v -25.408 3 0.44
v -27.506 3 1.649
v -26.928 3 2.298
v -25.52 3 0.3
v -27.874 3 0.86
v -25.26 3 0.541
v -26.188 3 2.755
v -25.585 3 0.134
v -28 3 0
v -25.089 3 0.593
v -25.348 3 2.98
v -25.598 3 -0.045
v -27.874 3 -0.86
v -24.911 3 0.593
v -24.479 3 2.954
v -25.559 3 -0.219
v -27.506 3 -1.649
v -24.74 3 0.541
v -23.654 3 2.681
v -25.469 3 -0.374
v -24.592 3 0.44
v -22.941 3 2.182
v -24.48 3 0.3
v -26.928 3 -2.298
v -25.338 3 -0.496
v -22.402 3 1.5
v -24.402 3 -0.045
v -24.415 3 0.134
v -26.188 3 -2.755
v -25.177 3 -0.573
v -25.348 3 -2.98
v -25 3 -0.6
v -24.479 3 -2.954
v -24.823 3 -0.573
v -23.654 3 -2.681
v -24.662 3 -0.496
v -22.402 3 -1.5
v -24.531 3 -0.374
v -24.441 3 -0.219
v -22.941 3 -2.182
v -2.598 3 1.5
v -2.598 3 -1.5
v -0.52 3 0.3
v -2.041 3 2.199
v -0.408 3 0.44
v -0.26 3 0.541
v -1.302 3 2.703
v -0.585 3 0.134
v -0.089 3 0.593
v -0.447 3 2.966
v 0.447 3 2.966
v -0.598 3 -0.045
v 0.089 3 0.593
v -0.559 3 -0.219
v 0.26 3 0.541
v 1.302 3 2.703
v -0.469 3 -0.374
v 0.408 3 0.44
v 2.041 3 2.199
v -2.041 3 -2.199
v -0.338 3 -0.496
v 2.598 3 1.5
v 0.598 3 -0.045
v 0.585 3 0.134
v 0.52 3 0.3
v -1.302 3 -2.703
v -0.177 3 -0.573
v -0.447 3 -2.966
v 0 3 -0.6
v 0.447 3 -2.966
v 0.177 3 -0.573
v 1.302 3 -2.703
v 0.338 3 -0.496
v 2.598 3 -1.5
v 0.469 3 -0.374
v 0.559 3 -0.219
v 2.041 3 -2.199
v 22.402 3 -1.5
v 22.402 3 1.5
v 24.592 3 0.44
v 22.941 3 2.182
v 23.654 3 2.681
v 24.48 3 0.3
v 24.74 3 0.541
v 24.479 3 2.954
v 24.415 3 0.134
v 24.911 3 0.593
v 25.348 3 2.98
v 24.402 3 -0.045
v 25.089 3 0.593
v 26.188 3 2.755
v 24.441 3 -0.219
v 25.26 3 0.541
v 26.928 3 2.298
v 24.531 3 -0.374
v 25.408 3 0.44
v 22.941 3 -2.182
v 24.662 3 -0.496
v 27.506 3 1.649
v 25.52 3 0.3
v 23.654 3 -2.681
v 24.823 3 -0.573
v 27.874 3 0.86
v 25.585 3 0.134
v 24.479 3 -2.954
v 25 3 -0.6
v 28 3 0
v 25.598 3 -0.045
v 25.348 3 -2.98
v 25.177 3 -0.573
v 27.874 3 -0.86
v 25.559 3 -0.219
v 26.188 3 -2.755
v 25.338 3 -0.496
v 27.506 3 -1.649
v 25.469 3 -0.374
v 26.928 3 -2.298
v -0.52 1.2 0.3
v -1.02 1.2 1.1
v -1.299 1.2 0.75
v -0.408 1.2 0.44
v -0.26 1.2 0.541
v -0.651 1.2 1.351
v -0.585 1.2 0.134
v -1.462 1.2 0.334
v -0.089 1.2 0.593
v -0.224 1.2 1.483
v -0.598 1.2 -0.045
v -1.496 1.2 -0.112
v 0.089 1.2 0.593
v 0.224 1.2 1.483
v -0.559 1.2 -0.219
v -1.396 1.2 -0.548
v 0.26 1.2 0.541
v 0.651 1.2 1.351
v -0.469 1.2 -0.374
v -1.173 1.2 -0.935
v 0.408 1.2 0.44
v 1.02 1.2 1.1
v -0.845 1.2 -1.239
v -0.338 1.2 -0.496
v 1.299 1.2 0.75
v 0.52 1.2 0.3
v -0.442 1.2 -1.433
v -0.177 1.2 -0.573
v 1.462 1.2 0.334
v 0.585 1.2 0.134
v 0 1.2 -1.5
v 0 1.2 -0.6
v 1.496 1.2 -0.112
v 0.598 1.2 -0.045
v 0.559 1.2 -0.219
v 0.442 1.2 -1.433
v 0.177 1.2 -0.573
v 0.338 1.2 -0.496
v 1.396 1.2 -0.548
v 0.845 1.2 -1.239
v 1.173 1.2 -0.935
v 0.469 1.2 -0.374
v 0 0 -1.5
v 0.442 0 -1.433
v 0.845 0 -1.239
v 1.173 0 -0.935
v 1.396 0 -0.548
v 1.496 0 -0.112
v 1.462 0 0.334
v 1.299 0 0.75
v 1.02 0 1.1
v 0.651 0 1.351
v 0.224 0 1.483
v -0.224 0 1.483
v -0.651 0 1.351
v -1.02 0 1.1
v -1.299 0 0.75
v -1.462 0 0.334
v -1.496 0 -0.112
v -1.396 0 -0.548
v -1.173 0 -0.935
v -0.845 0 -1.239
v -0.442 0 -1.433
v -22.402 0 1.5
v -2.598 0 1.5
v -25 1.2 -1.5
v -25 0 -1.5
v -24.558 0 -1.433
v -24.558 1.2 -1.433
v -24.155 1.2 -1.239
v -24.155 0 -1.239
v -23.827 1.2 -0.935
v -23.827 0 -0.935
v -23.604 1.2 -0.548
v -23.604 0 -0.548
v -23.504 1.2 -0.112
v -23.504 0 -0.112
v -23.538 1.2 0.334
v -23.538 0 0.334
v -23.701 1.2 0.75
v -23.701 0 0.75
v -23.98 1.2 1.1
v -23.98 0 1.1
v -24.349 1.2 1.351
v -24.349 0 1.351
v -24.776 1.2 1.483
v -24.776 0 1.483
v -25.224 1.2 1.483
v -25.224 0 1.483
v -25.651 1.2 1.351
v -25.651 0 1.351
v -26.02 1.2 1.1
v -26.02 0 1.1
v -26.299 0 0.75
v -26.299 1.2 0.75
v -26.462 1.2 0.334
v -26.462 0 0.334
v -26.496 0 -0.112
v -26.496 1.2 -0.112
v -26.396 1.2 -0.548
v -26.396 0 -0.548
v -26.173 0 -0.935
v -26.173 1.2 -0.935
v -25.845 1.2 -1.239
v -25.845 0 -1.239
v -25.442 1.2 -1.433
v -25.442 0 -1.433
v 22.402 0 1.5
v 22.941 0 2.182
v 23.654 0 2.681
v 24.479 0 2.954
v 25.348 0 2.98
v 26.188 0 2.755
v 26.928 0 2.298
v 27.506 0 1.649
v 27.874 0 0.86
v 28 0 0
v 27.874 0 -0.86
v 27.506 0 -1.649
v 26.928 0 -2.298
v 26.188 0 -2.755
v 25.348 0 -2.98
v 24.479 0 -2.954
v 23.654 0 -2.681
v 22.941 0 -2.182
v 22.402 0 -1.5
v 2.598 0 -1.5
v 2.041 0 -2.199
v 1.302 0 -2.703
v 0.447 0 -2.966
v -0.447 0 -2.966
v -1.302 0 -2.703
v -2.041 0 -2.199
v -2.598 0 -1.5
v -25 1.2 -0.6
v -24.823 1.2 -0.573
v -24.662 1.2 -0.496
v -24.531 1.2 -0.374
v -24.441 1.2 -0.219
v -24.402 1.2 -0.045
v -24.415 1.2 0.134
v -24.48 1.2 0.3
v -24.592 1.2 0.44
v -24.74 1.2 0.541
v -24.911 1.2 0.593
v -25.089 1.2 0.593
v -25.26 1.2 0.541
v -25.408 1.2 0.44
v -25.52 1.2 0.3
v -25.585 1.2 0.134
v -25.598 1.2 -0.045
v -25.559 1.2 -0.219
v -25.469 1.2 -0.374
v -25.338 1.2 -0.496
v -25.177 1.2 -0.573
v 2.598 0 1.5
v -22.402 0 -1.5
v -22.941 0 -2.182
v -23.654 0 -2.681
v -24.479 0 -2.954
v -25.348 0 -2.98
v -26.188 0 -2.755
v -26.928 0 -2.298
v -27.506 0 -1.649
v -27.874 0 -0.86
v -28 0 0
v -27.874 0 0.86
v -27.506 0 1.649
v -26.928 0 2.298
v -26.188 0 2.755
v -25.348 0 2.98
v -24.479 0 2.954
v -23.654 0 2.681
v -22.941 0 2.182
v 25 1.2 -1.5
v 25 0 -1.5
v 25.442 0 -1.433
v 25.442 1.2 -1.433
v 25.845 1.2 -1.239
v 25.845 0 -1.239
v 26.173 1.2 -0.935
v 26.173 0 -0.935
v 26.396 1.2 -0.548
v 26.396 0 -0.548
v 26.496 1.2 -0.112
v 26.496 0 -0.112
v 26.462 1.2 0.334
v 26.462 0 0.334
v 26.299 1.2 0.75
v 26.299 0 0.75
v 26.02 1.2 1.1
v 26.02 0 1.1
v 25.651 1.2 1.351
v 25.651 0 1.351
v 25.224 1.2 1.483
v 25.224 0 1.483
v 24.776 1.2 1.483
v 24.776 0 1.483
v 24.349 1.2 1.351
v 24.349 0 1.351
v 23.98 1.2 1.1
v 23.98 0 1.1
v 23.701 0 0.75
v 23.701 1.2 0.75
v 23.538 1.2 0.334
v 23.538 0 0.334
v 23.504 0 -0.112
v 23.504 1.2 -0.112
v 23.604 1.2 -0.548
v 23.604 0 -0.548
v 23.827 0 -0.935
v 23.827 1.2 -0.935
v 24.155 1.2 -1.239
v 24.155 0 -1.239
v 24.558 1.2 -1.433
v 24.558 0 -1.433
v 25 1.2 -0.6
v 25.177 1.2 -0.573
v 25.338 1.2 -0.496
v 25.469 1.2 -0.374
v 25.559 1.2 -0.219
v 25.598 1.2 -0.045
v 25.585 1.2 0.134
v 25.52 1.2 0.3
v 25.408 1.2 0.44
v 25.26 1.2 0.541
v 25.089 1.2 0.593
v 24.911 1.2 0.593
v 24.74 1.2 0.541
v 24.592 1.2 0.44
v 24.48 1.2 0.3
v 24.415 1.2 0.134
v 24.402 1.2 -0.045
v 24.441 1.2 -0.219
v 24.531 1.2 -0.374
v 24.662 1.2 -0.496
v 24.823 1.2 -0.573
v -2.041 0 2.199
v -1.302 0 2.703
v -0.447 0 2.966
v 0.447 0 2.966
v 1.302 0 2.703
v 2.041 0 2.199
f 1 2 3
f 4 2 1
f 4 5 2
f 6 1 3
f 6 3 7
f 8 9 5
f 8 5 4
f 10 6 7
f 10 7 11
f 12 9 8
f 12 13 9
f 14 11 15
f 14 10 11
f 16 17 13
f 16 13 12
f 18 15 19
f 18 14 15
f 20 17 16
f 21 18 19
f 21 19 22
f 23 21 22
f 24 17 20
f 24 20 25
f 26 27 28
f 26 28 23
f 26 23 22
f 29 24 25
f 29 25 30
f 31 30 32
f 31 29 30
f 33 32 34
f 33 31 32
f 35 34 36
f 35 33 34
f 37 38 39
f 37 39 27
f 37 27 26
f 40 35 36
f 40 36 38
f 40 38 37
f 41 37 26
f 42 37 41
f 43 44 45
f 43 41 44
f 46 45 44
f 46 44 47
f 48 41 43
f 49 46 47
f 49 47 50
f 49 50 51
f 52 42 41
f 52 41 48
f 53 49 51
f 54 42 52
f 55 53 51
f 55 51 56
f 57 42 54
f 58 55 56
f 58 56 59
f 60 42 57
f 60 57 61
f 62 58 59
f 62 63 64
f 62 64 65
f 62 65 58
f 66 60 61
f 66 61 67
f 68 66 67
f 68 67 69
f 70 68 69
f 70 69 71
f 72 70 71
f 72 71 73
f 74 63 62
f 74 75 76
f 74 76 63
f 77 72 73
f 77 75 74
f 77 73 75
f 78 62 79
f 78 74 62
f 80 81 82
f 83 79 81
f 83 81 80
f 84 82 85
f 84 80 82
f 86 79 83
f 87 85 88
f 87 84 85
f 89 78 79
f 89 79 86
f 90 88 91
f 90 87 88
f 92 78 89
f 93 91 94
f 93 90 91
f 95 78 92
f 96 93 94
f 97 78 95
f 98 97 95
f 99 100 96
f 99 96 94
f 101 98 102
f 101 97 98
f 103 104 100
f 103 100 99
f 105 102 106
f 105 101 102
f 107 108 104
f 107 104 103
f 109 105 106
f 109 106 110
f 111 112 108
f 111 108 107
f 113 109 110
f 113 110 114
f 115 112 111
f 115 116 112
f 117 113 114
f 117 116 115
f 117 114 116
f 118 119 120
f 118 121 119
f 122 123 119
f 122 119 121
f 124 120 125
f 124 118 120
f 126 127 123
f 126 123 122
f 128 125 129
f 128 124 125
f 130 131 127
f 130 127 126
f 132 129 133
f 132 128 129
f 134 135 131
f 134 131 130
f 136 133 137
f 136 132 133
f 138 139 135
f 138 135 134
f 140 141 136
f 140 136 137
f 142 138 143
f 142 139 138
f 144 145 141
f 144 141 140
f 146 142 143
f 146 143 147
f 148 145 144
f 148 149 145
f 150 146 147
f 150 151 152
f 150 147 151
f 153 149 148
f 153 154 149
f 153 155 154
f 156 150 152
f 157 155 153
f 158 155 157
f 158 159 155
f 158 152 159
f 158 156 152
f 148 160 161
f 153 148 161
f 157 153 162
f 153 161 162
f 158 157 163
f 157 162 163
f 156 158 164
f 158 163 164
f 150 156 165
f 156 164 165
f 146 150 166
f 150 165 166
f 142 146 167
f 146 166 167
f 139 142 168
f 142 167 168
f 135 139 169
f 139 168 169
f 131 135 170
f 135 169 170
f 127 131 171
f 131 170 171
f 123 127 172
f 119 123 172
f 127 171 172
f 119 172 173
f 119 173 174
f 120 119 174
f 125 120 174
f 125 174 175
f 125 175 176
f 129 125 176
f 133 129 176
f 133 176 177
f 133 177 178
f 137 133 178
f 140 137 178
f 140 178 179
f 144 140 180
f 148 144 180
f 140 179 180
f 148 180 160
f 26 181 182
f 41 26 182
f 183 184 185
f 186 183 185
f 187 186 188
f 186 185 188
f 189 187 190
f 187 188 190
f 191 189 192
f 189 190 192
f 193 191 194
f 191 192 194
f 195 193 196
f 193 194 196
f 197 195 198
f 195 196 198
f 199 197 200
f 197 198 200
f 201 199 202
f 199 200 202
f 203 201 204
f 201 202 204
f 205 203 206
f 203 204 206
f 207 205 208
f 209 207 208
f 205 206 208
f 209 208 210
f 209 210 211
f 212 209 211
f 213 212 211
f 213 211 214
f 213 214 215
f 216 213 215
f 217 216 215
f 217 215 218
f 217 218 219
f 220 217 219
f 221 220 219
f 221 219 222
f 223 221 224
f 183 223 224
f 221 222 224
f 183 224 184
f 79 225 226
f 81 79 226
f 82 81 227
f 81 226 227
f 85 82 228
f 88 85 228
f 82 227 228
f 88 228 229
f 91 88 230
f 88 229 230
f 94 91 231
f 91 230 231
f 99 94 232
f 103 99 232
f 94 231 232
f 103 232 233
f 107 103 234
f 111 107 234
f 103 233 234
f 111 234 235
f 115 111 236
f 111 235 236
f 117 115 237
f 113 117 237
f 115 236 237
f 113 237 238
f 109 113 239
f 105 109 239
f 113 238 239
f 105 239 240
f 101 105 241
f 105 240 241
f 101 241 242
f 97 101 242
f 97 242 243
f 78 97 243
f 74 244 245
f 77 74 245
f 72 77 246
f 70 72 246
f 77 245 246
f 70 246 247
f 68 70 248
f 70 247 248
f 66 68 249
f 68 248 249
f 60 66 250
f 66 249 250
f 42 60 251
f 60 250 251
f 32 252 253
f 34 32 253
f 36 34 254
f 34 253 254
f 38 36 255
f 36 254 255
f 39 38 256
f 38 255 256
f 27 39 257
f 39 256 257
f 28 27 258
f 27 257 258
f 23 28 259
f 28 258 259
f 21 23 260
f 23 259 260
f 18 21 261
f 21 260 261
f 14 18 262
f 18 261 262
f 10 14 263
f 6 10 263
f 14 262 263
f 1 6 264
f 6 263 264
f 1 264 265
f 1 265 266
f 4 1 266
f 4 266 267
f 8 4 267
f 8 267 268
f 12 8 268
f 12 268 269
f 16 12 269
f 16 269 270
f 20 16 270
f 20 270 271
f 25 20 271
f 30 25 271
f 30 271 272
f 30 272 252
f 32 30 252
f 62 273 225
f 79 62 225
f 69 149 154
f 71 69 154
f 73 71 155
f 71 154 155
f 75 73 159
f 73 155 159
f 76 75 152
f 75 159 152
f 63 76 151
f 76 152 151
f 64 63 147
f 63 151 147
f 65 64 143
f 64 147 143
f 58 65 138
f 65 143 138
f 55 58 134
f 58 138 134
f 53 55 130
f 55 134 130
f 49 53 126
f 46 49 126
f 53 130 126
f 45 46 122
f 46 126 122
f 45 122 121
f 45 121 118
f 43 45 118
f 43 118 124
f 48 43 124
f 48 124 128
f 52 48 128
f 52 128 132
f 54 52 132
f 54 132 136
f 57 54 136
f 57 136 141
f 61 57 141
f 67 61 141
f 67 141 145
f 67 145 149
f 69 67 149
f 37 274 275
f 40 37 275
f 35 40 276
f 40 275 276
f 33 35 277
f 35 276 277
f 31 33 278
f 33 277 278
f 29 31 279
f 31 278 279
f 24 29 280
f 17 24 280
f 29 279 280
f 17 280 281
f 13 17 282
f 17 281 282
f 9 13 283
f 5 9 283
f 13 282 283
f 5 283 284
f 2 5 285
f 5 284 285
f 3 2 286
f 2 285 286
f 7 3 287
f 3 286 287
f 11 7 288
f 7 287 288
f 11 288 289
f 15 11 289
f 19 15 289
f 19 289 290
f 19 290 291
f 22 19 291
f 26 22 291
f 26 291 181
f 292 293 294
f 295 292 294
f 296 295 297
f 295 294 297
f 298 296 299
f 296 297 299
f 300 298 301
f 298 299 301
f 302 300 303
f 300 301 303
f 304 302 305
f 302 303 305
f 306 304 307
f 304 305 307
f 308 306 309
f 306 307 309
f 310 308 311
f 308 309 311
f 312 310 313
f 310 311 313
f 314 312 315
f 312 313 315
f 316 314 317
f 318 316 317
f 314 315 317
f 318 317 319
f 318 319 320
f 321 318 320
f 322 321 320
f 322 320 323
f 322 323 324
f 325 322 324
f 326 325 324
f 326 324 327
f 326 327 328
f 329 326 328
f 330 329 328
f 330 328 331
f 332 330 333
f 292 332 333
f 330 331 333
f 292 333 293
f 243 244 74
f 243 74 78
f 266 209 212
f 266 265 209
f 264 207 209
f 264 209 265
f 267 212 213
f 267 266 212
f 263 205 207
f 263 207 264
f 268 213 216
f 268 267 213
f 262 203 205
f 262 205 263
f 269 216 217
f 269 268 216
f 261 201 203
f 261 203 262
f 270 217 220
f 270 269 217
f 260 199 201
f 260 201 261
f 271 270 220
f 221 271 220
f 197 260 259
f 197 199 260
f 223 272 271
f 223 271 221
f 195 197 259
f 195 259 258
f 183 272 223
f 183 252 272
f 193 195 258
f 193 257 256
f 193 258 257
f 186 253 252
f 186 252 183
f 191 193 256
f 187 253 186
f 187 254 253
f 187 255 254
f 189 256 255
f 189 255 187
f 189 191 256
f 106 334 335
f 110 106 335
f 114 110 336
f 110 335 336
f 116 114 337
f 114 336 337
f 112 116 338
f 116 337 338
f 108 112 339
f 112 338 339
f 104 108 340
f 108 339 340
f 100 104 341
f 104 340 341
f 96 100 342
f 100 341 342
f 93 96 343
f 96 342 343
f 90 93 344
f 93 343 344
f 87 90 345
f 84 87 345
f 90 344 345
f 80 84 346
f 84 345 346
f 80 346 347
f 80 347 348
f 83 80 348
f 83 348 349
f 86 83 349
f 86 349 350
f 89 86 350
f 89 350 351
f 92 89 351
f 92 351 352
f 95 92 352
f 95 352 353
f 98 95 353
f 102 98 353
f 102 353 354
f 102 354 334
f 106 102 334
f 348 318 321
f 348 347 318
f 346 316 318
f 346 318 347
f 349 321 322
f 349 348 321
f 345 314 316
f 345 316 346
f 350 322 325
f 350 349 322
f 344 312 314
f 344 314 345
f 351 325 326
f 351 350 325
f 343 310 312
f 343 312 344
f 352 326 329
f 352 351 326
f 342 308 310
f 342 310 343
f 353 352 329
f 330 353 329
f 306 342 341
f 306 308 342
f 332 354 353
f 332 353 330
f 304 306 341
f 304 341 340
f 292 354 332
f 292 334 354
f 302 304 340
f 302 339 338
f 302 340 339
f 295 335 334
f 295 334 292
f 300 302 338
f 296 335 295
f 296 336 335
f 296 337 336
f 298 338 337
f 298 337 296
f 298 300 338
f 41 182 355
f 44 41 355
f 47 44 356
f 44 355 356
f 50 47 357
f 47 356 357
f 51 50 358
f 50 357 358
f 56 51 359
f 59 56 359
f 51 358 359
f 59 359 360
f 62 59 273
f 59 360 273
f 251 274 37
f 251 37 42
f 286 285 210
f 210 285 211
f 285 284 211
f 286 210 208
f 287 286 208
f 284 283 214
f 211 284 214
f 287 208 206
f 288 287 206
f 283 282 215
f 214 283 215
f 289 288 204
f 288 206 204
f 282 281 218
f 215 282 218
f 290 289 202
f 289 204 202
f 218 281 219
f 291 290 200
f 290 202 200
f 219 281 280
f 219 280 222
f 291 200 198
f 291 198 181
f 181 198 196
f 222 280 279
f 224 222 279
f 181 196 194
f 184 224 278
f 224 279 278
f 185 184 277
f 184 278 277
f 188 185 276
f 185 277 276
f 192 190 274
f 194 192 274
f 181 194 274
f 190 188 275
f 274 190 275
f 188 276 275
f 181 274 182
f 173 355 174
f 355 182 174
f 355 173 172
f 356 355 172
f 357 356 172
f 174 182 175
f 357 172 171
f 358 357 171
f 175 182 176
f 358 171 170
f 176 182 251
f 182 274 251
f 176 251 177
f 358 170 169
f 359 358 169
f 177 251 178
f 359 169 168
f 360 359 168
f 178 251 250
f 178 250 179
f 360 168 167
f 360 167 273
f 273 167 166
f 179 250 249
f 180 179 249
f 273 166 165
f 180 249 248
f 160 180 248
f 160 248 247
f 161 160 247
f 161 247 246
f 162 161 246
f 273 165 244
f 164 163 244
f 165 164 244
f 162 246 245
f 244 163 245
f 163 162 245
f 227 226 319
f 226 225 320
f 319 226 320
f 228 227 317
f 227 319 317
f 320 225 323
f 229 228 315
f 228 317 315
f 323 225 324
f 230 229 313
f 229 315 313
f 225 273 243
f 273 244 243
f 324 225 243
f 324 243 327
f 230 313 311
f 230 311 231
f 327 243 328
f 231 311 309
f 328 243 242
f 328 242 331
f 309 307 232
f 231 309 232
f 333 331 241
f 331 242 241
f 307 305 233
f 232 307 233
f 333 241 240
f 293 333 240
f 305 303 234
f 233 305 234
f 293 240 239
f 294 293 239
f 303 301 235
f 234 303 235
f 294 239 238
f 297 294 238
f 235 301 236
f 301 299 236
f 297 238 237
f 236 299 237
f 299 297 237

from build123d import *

# Parameters (mm, degrees)
SKETCH_4_R          = 3
SKETCH_4_W          = 50
SKETCH_4_H          = 3
EXTRUDE_1_DEPTH     = 3
SKETCH_5_R          = 1.5
CUT_EXTRUDE_1_DEPTH = 1.2
SKETCH_6_R          = 0.6
CUT_EXTRUDE_2_DEPTH = 29.319604517


with BuildPart() as part:
    # 草图4 → 凸台-拉伸1 (new body)
    with BuildSketch(Plane(origin=(0, 0, 0), x_dir=(1, 0, 0), z_dir=(0, 1, 0))):
        Circle(SKETCH_4_R)
        with Locations((25, 0)):
            Circle(SKETCH_4_R)
        with Locations((-25, 0)):
            Circle(SKETCH_4_R)
        Rectangle(SKETCH_4_W, SKETCH_4_H)
    extrude(amount=EXTRUDE_1_DEPTH)

    # 草图5 → 切除-拉伸1 (cut)
    with BuildSketch(Plane.XZ):
        with Locations(Location((-25, 0, 0), (0, 0, 270))):
            Circle(SKETCH_5_R)
        with Locations(Location((0, 0, 0), (0, 0, 270))):
            Circle(SKETCH_5_R)
        with Locations(Location((25, 0, 0), (0, 0, 270))):
            Circle(SKETCH_5_R)
    extrude(amount=-CUT_EXTRUDE_1_DEPTH, mode=Mode.SUBTRACT)

    # 草图6 → 切除-拉伸2 (cut, through all)
    with BuildSketch(Plane(origin=(0, 0, 0), x_dir=(-1, 0, 0), z_dir=(0, -1, 0))):
        with Locations(Location((0, 0, 0), (0, 0, 90))):
            Circle(SKETCH_6_R)
        with Locations(Location((-25, 0, 0), (0, 0, 90))):
            Circle(SKETCH_6_R)
        with Locations(Location((25, 0, 0), (0, 0, 90))):
            Circle(SKETCH_6_R)
    extrude(amount=-CUT_EXTRUDE_2_DEPTH, mode=Mode.SUBTRACT)


solid = part.part
